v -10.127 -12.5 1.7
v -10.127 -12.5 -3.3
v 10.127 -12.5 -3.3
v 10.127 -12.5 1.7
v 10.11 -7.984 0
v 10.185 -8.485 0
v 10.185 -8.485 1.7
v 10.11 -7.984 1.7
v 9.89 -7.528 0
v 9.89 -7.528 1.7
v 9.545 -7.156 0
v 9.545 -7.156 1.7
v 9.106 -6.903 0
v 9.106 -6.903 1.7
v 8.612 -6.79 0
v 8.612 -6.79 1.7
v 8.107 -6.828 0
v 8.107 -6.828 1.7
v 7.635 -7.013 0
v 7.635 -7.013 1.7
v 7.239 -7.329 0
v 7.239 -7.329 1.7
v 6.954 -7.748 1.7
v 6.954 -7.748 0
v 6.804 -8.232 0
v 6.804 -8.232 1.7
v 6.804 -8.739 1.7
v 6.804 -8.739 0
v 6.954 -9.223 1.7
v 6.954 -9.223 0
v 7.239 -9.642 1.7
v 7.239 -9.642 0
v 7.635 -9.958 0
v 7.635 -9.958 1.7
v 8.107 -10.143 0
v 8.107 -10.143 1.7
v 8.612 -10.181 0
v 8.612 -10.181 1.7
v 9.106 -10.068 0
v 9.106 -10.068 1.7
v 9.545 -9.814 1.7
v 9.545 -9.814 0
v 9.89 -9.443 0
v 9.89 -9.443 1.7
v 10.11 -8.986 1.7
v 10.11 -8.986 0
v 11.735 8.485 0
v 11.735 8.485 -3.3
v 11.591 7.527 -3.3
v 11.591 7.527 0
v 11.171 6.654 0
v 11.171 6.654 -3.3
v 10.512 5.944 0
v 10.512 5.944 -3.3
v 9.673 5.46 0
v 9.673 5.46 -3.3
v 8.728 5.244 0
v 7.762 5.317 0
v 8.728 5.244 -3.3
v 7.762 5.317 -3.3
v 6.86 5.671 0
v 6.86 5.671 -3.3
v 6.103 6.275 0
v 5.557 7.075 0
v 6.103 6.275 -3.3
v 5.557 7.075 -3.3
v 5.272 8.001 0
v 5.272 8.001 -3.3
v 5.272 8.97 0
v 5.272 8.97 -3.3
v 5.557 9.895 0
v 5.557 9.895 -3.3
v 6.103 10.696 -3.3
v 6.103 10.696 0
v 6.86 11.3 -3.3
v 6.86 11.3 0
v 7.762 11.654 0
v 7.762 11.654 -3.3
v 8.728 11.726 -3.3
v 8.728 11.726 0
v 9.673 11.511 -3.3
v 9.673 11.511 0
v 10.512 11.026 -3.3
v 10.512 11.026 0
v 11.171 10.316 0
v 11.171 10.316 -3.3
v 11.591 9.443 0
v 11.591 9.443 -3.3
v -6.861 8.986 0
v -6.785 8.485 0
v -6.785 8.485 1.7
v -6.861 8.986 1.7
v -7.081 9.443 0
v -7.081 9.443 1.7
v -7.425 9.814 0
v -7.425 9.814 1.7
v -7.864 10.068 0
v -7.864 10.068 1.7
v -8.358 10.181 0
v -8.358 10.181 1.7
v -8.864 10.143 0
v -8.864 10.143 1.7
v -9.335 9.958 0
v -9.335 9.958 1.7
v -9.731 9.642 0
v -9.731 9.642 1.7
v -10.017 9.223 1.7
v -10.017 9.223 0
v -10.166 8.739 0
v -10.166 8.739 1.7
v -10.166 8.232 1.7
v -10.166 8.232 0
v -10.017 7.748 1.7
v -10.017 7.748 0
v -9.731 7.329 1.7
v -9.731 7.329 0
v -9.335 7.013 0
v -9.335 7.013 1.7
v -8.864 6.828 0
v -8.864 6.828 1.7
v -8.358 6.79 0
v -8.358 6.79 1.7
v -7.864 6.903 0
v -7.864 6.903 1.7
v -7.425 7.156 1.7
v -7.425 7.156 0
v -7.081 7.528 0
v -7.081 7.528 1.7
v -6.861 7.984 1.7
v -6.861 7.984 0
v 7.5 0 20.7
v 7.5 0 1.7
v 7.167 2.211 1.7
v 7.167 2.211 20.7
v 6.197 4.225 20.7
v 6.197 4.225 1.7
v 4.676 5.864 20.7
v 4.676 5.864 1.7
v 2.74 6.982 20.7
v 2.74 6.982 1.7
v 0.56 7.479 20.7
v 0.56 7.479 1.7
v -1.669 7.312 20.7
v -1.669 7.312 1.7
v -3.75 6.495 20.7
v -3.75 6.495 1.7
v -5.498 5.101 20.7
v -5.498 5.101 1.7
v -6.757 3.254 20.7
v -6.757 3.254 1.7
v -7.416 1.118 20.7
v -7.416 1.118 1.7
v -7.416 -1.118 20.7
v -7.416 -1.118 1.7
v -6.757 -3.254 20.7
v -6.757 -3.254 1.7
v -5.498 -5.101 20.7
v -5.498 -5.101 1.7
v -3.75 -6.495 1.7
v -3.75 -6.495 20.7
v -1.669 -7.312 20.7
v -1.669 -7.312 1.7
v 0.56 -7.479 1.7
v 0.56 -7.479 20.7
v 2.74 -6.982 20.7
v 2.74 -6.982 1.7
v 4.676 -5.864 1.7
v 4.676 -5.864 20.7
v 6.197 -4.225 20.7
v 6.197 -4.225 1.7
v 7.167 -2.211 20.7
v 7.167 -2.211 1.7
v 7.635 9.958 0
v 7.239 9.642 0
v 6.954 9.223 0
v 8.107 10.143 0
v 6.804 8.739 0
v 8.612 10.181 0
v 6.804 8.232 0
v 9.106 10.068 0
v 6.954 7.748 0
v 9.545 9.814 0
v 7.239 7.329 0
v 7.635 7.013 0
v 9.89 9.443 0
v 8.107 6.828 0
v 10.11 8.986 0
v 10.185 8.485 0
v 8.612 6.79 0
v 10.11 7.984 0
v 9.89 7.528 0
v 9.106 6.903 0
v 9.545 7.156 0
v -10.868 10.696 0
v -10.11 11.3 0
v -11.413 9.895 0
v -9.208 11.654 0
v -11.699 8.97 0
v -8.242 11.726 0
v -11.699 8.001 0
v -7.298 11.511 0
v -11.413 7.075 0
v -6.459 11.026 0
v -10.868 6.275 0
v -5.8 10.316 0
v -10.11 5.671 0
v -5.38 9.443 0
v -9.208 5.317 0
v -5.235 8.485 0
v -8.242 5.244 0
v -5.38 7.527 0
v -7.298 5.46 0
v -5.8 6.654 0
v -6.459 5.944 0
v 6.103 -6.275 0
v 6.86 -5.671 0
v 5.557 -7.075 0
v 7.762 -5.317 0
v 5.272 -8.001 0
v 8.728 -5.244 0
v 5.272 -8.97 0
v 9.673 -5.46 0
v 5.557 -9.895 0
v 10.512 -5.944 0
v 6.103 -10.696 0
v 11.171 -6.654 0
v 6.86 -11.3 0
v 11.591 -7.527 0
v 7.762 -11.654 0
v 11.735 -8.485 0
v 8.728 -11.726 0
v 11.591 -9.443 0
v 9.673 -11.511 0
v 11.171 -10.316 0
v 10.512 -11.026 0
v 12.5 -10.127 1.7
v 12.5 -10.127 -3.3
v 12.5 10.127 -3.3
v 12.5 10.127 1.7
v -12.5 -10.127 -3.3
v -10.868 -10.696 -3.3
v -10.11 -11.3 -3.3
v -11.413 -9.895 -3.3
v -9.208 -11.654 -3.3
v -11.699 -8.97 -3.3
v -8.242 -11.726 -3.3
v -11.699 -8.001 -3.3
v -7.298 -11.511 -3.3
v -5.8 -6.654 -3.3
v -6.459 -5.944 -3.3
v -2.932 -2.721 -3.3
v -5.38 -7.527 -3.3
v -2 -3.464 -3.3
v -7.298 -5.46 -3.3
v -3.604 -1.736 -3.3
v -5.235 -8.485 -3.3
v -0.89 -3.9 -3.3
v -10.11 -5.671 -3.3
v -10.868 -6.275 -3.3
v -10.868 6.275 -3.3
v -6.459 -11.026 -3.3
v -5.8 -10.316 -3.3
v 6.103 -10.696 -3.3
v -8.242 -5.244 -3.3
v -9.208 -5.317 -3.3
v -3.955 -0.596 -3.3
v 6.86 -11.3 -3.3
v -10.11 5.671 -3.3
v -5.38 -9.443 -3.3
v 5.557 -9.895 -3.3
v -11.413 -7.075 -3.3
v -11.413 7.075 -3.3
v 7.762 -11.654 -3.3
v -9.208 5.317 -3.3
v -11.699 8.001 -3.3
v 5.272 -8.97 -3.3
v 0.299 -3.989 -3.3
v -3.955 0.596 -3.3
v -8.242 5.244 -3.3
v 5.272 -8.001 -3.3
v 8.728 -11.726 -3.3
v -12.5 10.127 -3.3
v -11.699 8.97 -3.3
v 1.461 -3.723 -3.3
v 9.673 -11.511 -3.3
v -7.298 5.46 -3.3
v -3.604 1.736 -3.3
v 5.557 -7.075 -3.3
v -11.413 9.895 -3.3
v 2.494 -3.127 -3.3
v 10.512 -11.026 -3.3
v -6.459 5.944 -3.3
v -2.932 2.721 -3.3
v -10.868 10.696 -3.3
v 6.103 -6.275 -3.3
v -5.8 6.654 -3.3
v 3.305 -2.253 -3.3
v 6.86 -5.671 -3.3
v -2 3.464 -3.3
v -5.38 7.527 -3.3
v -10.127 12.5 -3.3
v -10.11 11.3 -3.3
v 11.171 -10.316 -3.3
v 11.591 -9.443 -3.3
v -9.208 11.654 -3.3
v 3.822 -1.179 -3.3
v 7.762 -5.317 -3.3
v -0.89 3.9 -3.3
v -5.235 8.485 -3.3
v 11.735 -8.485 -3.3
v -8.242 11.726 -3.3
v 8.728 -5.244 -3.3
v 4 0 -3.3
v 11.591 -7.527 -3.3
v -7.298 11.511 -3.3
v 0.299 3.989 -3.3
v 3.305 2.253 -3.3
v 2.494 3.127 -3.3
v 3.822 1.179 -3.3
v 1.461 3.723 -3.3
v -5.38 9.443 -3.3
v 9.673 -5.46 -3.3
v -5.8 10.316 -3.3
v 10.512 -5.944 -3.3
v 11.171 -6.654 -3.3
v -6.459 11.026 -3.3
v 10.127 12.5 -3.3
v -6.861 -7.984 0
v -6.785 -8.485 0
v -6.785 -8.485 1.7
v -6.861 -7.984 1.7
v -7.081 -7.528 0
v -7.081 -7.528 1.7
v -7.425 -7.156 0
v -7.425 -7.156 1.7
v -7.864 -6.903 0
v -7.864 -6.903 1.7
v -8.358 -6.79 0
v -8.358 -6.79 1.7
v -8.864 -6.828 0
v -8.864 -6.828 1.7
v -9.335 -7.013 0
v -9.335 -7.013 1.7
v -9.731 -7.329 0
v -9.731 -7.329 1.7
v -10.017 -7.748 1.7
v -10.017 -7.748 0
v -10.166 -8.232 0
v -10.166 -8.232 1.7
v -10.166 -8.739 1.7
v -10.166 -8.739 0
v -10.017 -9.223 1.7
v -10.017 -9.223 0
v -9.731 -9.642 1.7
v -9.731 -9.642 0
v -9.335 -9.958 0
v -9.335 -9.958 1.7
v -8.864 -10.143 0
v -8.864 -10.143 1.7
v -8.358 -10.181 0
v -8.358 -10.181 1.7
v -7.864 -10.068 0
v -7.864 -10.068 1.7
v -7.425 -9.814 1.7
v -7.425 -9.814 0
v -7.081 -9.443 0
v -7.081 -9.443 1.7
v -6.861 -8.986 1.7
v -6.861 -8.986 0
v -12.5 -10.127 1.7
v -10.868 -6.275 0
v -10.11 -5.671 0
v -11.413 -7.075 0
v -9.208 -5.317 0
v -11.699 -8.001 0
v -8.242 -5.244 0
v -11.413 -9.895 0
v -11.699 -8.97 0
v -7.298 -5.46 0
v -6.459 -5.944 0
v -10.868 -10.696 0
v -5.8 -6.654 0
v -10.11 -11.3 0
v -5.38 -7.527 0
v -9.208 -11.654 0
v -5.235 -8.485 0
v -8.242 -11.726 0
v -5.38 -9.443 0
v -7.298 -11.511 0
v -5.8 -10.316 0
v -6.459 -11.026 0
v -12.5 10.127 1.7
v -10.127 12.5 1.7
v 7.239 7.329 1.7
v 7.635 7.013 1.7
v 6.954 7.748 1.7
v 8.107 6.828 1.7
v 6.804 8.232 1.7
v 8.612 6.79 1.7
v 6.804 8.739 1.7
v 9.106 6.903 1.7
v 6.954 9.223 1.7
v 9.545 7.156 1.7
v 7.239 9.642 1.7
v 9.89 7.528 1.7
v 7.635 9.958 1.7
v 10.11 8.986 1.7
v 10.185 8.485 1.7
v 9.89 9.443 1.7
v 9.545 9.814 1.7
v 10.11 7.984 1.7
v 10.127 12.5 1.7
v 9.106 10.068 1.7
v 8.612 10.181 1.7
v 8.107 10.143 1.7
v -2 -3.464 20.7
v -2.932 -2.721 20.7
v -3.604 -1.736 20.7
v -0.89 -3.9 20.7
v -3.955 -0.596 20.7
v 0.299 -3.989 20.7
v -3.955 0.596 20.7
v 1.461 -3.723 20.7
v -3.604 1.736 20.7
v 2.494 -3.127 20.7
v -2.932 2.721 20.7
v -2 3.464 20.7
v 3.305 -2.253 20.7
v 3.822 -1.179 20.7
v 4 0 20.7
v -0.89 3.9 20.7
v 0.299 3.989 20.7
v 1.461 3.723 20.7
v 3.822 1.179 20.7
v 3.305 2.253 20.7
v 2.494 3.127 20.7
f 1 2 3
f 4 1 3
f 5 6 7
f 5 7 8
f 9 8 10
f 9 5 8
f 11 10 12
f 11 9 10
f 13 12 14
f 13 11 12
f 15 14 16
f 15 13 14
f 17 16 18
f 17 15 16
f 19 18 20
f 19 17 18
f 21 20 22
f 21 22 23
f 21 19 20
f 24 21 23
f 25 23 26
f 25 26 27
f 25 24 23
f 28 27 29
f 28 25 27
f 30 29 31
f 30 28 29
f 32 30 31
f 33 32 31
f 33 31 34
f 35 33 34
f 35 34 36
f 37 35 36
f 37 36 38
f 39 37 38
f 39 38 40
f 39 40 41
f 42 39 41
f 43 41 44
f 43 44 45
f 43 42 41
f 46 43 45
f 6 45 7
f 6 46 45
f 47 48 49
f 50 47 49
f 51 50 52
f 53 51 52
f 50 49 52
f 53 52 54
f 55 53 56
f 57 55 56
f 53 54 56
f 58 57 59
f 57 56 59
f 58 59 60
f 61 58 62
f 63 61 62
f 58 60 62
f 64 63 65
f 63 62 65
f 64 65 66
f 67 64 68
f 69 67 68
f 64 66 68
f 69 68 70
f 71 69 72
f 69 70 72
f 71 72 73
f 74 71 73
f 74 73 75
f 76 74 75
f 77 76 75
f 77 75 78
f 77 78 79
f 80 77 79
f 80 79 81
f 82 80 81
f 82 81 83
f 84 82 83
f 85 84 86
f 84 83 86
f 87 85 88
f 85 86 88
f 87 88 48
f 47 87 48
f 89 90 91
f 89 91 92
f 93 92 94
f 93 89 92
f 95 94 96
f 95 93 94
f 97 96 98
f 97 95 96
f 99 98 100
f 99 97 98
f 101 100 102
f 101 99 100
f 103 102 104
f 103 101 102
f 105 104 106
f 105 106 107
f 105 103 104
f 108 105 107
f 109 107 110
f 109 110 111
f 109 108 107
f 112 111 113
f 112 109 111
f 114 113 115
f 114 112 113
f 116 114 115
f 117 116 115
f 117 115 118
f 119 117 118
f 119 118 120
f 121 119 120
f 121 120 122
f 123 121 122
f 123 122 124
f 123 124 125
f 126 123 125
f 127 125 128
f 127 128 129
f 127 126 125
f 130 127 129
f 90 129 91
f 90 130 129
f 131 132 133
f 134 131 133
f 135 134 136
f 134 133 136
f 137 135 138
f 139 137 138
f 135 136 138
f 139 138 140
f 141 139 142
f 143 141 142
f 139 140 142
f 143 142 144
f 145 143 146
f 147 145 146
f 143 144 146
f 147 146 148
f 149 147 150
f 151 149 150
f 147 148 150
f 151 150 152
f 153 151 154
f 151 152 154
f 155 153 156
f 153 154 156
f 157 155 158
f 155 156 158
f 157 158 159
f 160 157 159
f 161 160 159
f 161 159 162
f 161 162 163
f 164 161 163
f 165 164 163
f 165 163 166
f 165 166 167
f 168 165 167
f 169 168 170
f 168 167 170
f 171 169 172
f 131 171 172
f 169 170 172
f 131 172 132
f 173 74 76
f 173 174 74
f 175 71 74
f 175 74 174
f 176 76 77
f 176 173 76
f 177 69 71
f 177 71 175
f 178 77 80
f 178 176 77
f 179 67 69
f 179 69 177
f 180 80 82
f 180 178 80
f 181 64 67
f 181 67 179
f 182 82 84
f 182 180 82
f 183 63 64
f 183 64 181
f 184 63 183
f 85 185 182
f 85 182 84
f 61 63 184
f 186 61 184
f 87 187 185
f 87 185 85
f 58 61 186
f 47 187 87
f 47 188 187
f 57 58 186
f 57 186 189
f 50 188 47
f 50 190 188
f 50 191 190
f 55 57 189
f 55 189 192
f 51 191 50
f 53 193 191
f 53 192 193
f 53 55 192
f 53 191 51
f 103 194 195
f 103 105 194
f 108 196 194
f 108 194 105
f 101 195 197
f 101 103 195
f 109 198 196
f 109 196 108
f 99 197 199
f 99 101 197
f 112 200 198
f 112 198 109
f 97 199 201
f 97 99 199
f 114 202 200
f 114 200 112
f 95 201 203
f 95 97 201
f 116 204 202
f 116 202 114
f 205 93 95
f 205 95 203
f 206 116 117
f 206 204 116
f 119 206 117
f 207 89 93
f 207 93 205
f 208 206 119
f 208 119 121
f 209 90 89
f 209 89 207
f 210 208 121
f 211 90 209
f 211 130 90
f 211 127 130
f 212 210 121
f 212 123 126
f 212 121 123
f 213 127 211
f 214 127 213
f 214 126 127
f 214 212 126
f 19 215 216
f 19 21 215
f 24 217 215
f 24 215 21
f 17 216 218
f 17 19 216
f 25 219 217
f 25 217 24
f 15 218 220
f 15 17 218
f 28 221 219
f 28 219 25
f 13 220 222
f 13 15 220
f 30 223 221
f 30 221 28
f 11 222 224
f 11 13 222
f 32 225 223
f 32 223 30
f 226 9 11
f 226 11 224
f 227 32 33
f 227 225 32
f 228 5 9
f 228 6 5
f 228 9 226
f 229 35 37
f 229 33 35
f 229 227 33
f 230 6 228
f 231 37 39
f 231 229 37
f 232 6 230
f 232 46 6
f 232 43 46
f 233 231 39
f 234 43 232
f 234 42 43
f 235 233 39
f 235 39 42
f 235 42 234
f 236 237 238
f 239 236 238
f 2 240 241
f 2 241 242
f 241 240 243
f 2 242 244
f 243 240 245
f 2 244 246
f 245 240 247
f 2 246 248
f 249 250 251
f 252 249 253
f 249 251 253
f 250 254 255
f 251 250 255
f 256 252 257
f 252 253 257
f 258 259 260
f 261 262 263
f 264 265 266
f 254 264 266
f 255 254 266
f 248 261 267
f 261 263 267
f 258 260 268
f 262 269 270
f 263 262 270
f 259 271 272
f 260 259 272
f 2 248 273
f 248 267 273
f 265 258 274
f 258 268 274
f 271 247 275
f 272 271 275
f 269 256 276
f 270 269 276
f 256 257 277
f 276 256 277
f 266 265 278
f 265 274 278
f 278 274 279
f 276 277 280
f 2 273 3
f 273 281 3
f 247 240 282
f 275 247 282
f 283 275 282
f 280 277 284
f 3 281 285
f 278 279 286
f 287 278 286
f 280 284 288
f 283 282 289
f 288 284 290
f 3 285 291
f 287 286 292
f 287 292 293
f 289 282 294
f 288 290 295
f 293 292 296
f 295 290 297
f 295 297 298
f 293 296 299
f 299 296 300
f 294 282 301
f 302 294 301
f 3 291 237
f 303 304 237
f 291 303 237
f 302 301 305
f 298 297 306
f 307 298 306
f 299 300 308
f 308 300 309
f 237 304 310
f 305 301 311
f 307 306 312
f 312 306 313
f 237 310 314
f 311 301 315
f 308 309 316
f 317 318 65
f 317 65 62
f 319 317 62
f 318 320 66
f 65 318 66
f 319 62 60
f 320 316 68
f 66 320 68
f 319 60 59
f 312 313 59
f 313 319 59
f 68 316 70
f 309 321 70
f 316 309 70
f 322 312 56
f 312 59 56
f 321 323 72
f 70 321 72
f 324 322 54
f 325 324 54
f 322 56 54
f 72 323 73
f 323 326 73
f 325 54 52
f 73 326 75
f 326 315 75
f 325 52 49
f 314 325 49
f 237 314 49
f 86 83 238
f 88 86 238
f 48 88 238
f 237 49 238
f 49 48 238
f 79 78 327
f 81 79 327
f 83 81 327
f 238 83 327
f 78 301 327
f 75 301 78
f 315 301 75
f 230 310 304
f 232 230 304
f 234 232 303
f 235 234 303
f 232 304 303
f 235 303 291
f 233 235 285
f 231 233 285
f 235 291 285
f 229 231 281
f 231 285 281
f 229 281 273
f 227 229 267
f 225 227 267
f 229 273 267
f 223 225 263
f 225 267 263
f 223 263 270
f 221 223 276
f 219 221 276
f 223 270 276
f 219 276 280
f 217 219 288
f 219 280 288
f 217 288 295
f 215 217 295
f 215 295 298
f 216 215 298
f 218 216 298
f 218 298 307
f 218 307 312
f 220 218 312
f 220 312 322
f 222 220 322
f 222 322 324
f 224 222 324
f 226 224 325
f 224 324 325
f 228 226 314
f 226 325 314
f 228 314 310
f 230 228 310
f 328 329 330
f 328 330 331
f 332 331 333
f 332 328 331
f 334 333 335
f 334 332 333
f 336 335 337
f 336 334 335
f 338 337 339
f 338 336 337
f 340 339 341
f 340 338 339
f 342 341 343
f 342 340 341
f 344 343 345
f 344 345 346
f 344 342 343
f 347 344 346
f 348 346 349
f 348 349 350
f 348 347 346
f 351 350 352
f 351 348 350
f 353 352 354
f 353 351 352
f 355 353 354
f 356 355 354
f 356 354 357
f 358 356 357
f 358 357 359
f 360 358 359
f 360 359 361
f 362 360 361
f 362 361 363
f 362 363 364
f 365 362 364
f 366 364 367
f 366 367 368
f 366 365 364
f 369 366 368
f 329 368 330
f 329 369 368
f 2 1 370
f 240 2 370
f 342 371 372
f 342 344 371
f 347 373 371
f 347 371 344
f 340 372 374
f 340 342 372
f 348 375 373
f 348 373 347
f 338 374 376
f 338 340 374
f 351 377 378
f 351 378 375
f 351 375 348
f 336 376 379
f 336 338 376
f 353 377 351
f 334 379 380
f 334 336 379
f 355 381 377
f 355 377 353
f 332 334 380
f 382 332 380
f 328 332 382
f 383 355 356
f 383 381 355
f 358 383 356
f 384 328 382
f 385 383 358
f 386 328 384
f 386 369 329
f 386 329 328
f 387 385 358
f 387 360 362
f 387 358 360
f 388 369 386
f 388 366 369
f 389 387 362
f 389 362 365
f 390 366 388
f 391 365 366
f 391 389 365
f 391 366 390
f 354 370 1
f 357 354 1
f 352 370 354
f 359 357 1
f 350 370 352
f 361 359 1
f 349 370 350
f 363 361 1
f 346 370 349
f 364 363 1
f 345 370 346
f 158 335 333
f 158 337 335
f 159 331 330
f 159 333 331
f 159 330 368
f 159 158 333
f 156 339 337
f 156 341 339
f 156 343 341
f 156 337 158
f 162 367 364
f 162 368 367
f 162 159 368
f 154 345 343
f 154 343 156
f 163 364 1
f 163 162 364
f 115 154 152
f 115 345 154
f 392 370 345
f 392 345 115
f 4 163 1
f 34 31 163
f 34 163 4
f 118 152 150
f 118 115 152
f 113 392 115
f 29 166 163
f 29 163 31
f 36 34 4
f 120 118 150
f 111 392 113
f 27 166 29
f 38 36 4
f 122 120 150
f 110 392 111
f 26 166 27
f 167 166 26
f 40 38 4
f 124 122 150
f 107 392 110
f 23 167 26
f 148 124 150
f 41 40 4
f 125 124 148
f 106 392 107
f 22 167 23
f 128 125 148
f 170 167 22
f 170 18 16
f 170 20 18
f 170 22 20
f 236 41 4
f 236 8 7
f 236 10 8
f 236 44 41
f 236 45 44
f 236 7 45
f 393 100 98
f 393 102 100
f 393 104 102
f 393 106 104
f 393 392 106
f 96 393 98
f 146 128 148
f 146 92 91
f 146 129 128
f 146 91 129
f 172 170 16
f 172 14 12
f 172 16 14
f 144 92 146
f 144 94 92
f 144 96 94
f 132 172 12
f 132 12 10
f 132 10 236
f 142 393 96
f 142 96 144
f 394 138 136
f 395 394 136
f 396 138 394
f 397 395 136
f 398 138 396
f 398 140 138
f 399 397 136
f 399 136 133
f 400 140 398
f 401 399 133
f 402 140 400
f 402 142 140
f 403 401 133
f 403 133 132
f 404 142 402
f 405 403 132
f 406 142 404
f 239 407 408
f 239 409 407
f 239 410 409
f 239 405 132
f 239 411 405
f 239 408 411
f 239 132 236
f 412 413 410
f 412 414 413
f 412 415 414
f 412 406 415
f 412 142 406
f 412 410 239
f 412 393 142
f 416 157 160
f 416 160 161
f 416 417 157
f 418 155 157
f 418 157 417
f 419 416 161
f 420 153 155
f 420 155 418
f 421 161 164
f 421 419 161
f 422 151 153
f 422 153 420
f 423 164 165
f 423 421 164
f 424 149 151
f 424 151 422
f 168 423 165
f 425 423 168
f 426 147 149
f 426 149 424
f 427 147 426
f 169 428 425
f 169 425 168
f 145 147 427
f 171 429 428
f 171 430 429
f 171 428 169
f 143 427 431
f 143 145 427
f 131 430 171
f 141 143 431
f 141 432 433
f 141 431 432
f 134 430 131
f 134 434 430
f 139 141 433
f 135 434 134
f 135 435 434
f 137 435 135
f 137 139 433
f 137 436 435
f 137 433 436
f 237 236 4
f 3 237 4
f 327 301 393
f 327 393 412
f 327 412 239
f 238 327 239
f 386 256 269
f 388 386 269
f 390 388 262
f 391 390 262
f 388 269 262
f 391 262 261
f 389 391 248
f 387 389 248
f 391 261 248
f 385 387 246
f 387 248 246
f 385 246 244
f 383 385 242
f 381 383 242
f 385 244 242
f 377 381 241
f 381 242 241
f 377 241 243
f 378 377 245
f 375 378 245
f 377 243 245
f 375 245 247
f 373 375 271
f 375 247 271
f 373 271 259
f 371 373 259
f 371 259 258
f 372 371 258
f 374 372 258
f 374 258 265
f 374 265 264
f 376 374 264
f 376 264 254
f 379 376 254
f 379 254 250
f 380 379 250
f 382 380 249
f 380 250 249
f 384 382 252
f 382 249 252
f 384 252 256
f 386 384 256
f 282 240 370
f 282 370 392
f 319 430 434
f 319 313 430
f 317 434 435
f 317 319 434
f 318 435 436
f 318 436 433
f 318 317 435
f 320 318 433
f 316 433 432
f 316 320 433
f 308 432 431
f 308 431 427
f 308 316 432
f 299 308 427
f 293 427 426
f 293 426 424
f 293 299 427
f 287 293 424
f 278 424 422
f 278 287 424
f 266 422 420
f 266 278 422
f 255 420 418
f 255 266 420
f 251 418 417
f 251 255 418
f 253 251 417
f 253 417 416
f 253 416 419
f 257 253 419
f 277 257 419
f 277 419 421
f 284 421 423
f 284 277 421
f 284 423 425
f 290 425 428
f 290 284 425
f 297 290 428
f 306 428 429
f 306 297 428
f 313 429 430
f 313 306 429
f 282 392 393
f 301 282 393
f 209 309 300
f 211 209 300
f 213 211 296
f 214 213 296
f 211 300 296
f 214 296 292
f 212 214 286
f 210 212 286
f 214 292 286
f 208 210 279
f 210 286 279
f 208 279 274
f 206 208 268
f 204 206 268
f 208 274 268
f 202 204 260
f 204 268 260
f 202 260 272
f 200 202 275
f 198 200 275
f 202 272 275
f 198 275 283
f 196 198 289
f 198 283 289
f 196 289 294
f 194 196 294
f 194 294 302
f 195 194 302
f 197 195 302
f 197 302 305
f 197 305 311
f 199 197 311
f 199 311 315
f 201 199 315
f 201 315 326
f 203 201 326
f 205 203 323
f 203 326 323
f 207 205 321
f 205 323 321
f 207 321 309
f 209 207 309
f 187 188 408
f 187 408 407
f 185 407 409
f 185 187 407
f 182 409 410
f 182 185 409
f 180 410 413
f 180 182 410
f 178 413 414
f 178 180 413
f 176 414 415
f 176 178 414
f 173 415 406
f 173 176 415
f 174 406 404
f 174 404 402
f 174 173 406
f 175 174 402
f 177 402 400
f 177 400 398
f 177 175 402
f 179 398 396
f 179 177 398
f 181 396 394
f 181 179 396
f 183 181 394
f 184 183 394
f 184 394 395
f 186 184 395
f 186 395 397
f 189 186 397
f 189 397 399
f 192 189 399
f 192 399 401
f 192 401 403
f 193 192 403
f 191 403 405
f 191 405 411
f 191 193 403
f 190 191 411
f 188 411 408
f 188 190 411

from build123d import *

# Parameters (mm, degrees)
F0_W     = 25
F0_H     = 25
F0_R     = 1.7
F0_R_2   = 7.5
F0_R_3   = 4
F1_DEPTH = 3.3
F2_DEPTH = 1.7
F3_R     = 7.5
F3_R_2   = 4
F4_DEPTH = 19
F6_DEPTH = 25
F7_R     = 3.25
F7_R_2   = 1.7
F8_DEPTH = 3.3


# Not quite as in the source:
# - a feature names something its author has since deleted; it is built from what else it names


with BuildPart() as f1:
    # F0 (on Top) → F1 (new body)
    with BuildSketch(Plane.XY):
        Rectangle(F0_W, F0_H)
        with Locations((-8.4852813742, -8.4852813742)):
            Circle(F0_R, mode=Mode.SUBTRACT)
        with Locations((8.4852813742, -8.4852813742)):
            Circle(F0_R, mode=Mode.SUBTRACT)
        with Locations((-8.4852813742, 8.4852813742)):
            Circle(F0_R, mode=Mode.SUBTRACT)
        Circle(F0_R_2, mode=Mode.SUBTRACT)
        with Locations((8.4852813742, 8.4852813742)):
            Circle(F0_R, mode=Mode.SUBTRACT)
        Circle(F0_R_2)
        Circle(F0_R_3, mode=Mode.SUBTRACT)
    extrude(amount=-F1_DEPTH)

    # F0 (on Top) → F2 (join)
    with BuildSketch(Plane.XY):
        Rectangle(F0_W, F0_H)
        with Locations((-8.4852813742, -8.4852813742)):
            Circle(F0_R, mode=Mode.SUBTRACT)
        with Locations((8.4852813742, -8.4852813742)):
            Circle(F0_R, mode=Mode.SUBTRACT)
        with Locations((-8.4852813742, 8.4852813742)):
            Circle(F0_R, mode=Mode.SUBTRACT)
        Circle(F0_R_2, mode=Mode.SUBTRACT)
        with Locations((8.4852813742, 8.4852813742)):
            Circle(F0_R, mode=Mode.SUBTRACT)
        Circle(F0_R_2)
        Circle(F0_R_3, mode=Mode.SUBTRACT)
    extrude(amount=F2_DEPTH)

    # F3 (on face) → F4 (join)
    with BuildSketch(Plane.XY.offset(1.7)):
        Circle(F3_R)
        Circle(F3_R_2, mode=Mode.SUBTRACT)
    extrude(amount=F4_DEPTH)

    # F5 (on face) → F6 (cut)
    with BuildSketch(Plane.XY.offset(1.7)):
        Polygon((-12.5, 12.5), (-12.5, 10.127416998), (-10.127416998, 12.5), align=None)
        Polygon((-10.127416998, -12.5), (-12.5, -10.127416998), (-12.5, -12.5), align=None)
        Polygon((12.5, -10.127416998), (10.127416998, -12.5), (12.5, -12.5), align=None)
        Polygon((12.5, 12.5), (10.127416998, 12.5), (12.5, 10.127416998), align=None)
    extrude(amount=-F6_DEPTH, mode=Mode.SUBTRACT)

    # F7 (on face) → F8 (cut)
    with BuildSketch(Plane(origin=(0, 0, -3.3), x_dir=(1, 0, 0), z_dir=(0, 0, -1))):
        with Locations((-8.4852813742, 8.4852813742)):
            Circle(F7_R)
        with Locations((-8.4852813742, 8.4852813742)):
            Circle(F7_R_2, mode=Mode.SUBTRACT)
        with Locations((8.4852813742, 8.4852813742)):
            Circle(F7_R)
        with Locations((8.4852813742, 8.4852813742)):
            Circle(F7_R_2, mode=Mode.SUBTRACT)
        with Locations((-8.4852813742, -8.4852813742)):
            Circle(F7_R)
        with Locations((-8.4852813742, -8.4852813742)):
            Circle(F7_R_2, mode=Mode.SUBTRACT)
        with Locations((8.4852813742, -8.4852813742)):
            Circle(F7_R)
        with Locations((8.4852813742, -8.4852813742)):
            Circle(F7_R_2, mode=Mode.SUBTRACT)
    extrude(amount=-F8_DEPTH, mode=Mode.SUBTRACT)


solid = f1.part
